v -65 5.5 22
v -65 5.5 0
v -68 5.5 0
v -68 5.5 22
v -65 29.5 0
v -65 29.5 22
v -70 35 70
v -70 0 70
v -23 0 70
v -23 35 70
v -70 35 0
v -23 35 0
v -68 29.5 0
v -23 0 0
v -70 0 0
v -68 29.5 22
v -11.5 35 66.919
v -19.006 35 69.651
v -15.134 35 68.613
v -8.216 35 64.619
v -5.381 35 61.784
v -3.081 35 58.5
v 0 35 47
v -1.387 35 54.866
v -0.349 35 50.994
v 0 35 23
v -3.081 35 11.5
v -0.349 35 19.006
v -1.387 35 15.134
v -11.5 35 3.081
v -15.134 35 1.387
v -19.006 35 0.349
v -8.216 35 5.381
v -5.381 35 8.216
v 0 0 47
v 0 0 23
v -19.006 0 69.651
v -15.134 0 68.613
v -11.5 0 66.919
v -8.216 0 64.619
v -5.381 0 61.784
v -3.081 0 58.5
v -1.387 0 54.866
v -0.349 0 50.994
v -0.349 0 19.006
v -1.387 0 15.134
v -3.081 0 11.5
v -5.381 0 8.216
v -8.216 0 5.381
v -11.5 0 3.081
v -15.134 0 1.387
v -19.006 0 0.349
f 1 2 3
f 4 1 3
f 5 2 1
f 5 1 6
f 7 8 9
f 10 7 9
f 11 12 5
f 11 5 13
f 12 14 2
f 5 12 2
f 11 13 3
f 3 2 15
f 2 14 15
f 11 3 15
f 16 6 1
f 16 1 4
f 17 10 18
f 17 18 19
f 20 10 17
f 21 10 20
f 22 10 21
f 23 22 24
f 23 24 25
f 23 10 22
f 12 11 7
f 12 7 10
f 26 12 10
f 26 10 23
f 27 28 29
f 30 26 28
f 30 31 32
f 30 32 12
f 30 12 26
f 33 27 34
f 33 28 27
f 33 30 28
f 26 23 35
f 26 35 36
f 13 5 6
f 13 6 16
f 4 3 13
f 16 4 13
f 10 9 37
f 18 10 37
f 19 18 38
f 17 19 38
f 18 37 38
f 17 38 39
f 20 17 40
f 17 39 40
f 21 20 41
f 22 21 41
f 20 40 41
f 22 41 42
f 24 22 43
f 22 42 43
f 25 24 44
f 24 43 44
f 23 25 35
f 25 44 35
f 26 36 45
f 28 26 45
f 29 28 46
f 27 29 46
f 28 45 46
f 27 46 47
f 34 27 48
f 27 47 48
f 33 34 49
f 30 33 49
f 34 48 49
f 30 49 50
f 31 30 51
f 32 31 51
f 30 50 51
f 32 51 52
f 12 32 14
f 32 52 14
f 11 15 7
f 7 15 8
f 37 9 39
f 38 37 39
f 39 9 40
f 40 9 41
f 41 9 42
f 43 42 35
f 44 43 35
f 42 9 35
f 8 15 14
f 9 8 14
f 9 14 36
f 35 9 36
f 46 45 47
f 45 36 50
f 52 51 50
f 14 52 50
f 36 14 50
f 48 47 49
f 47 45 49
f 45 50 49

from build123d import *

# Parameters (mm, degrees)
SALIENTE_EXTRUIR1_DEPTH = 35
CROQUIS2_W              = 3
CROQUIS2_H              = 24
CORTAR_EXTRUIR1_DEPTH   = 22


with BuildPart() as part:
    # Croquis1 → Saliente-Extruir1 (new body)
    with BuildSketch(Plane(origin=(0, 0, 0), x_dir=(1, 0, 0), z_dir=(0, 1, 0))):
        with BuildLine():
            Line((-23, 0), (-70, 0))
            Line((-70, 0), (-70, -70))
            Line((-70, -70), (-23, -70))
            ThreePointArc((-23, -70), (-6.736544033, -63.263455967), (0, -47))
            Line((0, -47), (0, -23))
            ThreePointArc((0, -23), (-6.736544033, -6.736544033), (-23, 0))
        make_face()
    extrude(amount=SALIENTE_EXTRUIR1_DEPTH)

    # Croquis2 → Cortar-Extruir1 (cut)
    with BuildSketch(Plane(origin=(0, 0, 0), x_dir=(-1, 0, 0), z_dir=(0, 0, -1))):
        with Locations((66.5, 17.5)):
            Rectangle(CROQUIS2_W, CROQUIS2_H)
    extrude(amount=-CORTAR_EXTRUIR1_DEPTH, mode=Mode.SUBTRACT)


solid = part.part
